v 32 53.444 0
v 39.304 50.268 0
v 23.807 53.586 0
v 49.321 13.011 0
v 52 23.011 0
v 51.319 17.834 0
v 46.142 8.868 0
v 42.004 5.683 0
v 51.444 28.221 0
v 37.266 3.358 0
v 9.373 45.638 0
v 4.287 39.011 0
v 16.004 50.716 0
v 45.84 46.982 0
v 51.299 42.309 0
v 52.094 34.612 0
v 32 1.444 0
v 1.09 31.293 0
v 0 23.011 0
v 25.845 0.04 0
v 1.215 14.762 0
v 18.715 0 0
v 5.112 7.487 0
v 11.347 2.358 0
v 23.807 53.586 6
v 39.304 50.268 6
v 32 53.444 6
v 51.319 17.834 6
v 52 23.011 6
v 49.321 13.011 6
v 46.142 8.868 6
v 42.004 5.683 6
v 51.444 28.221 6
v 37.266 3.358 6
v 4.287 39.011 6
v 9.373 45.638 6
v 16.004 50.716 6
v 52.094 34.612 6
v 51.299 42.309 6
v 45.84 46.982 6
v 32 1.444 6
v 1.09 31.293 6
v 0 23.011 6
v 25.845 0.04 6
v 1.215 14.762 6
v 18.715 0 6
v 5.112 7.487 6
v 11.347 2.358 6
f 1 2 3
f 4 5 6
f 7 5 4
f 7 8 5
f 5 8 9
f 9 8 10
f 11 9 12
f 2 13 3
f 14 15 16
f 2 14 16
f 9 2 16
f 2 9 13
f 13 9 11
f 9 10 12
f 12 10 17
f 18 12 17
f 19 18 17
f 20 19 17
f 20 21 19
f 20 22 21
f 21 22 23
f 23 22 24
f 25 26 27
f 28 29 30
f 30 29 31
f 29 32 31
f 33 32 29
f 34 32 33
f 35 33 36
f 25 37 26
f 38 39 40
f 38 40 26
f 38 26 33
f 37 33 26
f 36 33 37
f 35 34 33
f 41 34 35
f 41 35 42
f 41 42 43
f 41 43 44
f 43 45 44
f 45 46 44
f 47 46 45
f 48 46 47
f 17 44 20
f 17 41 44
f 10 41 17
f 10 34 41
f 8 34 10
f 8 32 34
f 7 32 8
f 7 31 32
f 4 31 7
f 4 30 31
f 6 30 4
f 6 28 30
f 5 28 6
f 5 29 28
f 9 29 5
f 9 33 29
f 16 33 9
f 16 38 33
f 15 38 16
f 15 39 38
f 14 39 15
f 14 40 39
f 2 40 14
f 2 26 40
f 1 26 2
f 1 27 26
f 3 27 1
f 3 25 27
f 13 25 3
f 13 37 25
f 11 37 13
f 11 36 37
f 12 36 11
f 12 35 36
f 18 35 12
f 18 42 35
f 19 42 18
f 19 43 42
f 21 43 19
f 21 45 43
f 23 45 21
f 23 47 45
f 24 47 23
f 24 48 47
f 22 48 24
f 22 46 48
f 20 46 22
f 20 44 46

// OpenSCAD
$fn = 32;

// ----------------------------------------------------------------------
// Cam disc: base radius 20.0 mm, lift 12.0 mm, 24 profile points
// ----------------------------------------------------------------------

// --- parameters (mm) ---
profile_height = 6;       // extrusion height
profile_points = 24;      // points of the closed outline

profile = [[52, 23.011], [51.444, 28.221], [52.094, 34.612], [51.299, 42.309], [45.84, 46.982], [39.304, 50.268], [32, 53.444], [23.807, 53.586], [16.004, 50.716], [9.373, 45.638], [4.287, 39.011], [1.09, 31.293], [0, 23.011], [1.215, 14.762], [5.112, 7.487], [11.347, 2.358], [18.715, 0], [25.845, 0.04], [32, 1.444], [37.266, 3.358], [42.004, 5.683], [46.142, 8.868], [49.321, 13.011], [51.319, 17.834]];  // single closed polygon, 24 points, counter clockwise

// --- the one profile operation ---
linear_extrude(height = profile_height) polygon(points = profile);
